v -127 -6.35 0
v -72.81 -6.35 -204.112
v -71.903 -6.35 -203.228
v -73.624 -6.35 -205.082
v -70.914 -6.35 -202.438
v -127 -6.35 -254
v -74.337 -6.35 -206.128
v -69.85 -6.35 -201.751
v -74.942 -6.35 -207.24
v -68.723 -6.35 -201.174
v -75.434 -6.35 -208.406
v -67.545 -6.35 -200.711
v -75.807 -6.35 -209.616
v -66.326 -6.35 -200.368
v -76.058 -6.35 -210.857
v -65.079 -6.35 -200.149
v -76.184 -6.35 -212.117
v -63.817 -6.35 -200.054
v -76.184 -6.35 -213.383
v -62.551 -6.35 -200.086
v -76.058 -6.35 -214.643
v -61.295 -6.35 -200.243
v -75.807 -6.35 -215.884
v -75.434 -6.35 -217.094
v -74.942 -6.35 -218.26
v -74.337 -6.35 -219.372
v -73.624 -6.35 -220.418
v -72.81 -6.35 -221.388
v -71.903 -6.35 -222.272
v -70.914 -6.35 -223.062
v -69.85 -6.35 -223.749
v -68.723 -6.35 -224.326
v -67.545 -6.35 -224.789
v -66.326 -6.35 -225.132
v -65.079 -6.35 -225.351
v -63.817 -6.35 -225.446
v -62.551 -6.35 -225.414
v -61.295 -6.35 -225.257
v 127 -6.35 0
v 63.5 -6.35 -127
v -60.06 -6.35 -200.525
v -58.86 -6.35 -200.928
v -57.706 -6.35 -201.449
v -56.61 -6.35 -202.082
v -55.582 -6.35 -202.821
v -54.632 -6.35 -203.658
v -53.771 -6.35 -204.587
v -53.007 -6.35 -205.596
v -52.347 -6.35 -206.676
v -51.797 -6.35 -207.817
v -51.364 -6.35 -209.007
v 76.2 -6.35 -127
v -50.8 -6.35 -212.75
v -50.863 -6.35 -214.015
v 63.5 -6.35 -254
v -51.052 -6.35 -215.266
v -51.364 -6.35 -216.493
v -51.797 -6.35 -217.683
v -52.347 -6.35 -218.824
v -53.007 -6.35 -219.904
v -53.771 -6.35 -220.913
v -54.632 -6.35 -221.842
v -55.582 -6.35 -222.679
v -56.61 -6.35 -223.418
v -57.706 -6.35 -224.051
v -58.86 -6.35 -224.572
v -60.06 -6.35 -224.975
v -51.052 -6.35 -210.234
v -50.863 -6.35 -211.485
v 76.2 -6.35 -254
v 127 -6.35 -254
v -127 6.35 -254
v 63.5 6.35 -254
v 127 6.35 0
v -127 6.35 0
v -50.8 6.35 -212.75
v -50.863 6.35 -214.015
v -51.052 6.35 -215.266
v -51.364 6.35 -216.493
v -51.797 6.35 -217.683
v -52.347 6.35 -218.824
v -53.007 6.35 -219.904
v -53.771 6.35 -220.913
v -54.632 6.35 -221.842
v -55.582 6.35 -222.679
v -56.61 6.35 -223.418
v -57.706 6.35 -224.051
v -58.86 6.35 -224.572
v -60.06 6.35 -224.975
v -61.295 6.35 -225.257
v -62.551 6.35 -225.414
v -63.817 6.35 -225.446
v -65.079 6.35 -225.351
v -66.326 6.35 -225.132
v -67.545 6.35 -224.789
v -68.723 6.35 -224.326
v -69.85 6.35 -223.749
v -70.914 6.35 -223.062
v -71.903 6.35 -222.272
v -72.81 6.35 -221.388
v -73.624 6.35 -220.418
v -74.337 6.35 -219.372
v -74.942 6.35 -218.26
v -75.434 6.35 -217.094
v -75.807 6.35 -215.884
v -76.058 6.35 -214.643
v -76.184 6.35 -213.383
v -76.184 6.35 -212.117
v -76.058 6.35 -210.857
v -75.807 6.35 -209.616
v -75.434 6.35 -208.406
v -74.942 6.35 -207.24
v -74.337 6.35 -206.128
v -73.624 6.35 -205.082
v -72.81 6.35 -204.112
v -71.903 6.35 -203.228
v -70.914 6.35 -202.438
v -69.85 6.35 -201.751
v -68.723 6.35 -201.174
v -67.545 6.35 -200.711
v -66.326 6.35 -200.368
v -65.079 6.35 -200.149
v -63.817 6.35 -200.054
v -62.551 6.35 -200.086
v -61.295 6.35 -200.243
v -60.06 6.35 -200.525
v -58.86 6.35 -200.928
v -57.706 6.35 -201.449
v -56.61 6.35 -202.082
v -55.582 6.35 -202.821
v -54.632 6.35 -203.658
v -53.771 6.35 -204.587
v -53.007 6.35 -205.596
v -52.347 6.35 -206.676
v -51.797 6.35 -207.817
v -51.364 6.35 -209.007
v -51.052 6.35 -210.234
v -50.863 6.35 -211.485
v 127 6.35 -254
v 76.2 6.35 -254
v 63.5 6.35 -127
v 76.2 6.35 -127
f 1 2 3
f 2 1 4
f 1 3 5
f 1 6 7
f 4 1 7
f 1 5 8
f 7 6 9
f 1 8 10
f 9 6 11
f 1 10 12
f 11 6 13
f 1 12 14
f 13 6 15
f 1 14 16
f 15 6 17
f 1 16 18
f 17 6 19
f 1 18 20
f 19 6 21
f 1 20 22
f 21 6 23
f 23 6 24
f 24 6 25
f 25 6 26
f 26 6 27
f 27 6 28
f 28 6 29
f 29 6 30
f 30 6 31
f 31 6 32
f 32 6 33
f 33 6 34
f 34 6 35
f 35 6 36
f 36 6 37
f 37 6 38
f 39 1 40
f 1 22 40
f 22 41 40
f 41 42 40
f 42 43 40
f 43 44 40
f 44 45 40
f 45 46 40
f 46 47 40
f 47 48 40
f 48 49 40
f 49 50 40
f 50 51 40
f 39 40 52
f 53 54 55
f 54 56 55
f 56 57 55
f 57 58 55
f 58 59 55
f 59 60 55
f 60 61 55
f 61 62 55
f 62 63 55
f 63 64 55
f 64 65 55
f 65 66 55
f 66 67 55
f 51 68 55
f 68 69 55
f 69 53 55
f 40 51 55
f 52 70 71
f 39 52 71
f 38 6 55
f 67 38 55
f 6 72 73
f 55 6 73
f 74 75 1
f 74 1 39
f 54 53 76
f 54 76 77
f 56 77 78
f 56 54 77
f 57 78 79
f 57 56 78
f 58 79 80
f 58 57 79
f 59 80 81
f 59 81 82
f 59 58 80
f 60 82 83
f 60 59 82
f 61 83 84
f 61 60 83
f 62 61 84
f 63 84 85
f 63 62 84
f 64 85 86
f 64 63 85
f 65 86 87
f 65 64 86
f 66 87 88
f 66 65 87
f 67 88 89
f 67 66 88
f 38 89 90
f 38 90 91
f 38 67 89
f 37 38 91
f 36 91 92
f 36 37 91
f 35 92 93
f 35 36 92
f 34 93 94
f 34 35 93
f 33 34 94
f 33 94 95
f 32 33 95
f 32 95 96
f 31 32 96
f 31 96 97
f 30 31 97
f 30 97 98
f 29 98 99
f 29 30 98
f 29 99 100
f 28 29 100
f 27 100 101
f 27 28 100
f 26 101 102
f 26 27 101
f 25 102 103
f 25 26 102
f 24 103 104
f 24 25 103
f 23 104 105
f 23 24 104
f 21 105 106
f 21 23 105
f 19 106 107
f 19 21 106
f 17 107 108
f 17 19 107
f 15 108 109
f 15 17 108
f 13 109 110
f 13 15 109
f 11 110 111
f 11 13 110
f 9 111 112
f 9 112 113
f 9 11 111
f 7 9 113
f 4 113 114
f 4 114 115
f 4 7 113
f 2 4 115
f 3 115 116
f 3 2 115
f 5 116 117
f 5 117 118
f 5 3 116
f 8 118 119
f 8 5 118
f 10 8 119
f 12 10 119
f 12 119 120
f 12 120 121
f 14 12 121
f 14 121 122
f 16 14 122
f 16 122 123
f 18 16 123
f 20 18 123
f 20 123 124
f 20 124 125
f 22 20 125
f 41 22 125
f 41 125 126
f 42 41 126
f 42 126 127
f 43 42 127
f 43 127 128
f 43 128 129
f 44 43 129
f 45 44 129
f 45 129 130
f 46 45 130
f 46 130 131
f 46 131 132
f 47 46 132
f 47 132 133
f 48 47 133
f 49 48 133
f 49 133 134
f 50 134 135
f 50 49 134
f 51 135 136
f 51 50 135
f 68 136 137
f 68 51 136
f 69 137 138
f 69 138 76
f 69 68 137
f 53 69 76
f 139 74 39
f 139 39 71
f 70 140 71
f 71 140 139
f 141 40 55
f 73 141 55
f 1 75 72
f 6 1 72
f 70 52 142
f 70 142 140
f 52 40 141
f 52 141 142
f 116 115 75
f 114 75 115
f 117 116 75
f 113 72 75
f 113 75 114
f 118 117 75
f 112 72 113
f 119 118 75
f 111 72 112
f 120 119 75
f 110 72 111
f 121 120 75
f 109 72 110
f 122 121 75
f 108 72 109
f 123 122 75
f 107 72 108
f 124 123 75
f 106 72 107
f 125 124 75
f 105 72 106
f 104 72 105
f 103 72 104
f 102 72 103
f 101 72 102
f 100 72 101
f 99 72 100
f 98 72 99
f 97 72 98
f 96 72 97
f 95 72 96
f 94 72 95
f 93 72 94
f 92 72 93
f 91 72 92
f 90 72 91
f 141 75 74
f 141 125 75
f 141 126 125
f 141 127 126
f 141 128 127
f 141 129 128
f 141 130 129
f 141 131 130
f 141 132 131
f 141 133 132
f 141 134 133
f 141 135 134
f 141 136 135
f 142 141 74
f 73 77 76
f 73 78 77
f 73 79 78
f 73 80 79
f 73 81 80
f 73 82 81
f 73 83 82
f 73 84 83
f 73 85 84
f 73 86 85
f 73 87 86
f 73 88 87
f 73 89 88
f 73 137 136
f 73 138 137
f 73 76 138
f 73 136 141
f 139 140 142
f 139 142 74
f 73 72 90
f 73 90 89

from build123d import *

# Parameters (mm, degrees)
SKETCH1_W               = 254
SKETCH1_H               = 254
BOSS_EXTRUDE1_DEPTH     = 6.35
CAVITY1_START           = -6.35
CAVITY1_OUTLINE_R       = 12.7
CAVITY1_DEPTH           = 12.7
CUT_EXTRUDE1_DEPTH      = 285.051619429
CUT_EXTRUDE1_DEPTH_BACK = 285.051619429
SKETCH2_W               = 12.7
SKETCH2_H               = 127


# Read off the part's stored shape, not the designer's step: Cavity1
with BuildPart() as part:
    # Sketch1 → Boss-Extrude1 (new, symmetric)
    with BuildSketch(Plane(origin=(0, 0, 0), x_dir=(1, 0, 0), z_dir=(0, 1, 0))):
        with Locations((0, 127)):
            Rectangle(SKETCH1_W, SKETCH1_H)
    extrude(amount=BOSS_EXTRUDE1_DEPTH, both=True)

    # Cavity1 outline → Cavity1 (cut)
    with BuildSketch(Plane(origin=(0, 0, 0), x_dir=(1, 0, 0), z_dir=(0, 1, 0)).offset(CAVITY1_START)):
        with Locations((-63.5, 212.75)):
            Circle(CAVITY1_OUTLINE_R)
    extrude(amount=CAVITY1_DEPTH, mode=Mode.SUBTRACT)

    # Sketch2 → Cut-Extrude1 (cut, two sides: drawn at the far end of the back side and taken through both)
    with BuildSketch(Plane(origin=(0, 0, 0), x_dir=(1, 0, 0), z_dir=(0, 1, 0)).offset(-CUT_EXTRUDE1_DEPTH_BACK)):
        with Locations((69.85, 190.5)):
            Rectangle(SKETCH2_W, SKETCH2_H)
    extrude(amount=CUT_EXTRUDE1_DEPTH + CUT_EXTRUDE1_DEPTH_BACK, mode=Mode.SUBTRACT)


solid = part.part
